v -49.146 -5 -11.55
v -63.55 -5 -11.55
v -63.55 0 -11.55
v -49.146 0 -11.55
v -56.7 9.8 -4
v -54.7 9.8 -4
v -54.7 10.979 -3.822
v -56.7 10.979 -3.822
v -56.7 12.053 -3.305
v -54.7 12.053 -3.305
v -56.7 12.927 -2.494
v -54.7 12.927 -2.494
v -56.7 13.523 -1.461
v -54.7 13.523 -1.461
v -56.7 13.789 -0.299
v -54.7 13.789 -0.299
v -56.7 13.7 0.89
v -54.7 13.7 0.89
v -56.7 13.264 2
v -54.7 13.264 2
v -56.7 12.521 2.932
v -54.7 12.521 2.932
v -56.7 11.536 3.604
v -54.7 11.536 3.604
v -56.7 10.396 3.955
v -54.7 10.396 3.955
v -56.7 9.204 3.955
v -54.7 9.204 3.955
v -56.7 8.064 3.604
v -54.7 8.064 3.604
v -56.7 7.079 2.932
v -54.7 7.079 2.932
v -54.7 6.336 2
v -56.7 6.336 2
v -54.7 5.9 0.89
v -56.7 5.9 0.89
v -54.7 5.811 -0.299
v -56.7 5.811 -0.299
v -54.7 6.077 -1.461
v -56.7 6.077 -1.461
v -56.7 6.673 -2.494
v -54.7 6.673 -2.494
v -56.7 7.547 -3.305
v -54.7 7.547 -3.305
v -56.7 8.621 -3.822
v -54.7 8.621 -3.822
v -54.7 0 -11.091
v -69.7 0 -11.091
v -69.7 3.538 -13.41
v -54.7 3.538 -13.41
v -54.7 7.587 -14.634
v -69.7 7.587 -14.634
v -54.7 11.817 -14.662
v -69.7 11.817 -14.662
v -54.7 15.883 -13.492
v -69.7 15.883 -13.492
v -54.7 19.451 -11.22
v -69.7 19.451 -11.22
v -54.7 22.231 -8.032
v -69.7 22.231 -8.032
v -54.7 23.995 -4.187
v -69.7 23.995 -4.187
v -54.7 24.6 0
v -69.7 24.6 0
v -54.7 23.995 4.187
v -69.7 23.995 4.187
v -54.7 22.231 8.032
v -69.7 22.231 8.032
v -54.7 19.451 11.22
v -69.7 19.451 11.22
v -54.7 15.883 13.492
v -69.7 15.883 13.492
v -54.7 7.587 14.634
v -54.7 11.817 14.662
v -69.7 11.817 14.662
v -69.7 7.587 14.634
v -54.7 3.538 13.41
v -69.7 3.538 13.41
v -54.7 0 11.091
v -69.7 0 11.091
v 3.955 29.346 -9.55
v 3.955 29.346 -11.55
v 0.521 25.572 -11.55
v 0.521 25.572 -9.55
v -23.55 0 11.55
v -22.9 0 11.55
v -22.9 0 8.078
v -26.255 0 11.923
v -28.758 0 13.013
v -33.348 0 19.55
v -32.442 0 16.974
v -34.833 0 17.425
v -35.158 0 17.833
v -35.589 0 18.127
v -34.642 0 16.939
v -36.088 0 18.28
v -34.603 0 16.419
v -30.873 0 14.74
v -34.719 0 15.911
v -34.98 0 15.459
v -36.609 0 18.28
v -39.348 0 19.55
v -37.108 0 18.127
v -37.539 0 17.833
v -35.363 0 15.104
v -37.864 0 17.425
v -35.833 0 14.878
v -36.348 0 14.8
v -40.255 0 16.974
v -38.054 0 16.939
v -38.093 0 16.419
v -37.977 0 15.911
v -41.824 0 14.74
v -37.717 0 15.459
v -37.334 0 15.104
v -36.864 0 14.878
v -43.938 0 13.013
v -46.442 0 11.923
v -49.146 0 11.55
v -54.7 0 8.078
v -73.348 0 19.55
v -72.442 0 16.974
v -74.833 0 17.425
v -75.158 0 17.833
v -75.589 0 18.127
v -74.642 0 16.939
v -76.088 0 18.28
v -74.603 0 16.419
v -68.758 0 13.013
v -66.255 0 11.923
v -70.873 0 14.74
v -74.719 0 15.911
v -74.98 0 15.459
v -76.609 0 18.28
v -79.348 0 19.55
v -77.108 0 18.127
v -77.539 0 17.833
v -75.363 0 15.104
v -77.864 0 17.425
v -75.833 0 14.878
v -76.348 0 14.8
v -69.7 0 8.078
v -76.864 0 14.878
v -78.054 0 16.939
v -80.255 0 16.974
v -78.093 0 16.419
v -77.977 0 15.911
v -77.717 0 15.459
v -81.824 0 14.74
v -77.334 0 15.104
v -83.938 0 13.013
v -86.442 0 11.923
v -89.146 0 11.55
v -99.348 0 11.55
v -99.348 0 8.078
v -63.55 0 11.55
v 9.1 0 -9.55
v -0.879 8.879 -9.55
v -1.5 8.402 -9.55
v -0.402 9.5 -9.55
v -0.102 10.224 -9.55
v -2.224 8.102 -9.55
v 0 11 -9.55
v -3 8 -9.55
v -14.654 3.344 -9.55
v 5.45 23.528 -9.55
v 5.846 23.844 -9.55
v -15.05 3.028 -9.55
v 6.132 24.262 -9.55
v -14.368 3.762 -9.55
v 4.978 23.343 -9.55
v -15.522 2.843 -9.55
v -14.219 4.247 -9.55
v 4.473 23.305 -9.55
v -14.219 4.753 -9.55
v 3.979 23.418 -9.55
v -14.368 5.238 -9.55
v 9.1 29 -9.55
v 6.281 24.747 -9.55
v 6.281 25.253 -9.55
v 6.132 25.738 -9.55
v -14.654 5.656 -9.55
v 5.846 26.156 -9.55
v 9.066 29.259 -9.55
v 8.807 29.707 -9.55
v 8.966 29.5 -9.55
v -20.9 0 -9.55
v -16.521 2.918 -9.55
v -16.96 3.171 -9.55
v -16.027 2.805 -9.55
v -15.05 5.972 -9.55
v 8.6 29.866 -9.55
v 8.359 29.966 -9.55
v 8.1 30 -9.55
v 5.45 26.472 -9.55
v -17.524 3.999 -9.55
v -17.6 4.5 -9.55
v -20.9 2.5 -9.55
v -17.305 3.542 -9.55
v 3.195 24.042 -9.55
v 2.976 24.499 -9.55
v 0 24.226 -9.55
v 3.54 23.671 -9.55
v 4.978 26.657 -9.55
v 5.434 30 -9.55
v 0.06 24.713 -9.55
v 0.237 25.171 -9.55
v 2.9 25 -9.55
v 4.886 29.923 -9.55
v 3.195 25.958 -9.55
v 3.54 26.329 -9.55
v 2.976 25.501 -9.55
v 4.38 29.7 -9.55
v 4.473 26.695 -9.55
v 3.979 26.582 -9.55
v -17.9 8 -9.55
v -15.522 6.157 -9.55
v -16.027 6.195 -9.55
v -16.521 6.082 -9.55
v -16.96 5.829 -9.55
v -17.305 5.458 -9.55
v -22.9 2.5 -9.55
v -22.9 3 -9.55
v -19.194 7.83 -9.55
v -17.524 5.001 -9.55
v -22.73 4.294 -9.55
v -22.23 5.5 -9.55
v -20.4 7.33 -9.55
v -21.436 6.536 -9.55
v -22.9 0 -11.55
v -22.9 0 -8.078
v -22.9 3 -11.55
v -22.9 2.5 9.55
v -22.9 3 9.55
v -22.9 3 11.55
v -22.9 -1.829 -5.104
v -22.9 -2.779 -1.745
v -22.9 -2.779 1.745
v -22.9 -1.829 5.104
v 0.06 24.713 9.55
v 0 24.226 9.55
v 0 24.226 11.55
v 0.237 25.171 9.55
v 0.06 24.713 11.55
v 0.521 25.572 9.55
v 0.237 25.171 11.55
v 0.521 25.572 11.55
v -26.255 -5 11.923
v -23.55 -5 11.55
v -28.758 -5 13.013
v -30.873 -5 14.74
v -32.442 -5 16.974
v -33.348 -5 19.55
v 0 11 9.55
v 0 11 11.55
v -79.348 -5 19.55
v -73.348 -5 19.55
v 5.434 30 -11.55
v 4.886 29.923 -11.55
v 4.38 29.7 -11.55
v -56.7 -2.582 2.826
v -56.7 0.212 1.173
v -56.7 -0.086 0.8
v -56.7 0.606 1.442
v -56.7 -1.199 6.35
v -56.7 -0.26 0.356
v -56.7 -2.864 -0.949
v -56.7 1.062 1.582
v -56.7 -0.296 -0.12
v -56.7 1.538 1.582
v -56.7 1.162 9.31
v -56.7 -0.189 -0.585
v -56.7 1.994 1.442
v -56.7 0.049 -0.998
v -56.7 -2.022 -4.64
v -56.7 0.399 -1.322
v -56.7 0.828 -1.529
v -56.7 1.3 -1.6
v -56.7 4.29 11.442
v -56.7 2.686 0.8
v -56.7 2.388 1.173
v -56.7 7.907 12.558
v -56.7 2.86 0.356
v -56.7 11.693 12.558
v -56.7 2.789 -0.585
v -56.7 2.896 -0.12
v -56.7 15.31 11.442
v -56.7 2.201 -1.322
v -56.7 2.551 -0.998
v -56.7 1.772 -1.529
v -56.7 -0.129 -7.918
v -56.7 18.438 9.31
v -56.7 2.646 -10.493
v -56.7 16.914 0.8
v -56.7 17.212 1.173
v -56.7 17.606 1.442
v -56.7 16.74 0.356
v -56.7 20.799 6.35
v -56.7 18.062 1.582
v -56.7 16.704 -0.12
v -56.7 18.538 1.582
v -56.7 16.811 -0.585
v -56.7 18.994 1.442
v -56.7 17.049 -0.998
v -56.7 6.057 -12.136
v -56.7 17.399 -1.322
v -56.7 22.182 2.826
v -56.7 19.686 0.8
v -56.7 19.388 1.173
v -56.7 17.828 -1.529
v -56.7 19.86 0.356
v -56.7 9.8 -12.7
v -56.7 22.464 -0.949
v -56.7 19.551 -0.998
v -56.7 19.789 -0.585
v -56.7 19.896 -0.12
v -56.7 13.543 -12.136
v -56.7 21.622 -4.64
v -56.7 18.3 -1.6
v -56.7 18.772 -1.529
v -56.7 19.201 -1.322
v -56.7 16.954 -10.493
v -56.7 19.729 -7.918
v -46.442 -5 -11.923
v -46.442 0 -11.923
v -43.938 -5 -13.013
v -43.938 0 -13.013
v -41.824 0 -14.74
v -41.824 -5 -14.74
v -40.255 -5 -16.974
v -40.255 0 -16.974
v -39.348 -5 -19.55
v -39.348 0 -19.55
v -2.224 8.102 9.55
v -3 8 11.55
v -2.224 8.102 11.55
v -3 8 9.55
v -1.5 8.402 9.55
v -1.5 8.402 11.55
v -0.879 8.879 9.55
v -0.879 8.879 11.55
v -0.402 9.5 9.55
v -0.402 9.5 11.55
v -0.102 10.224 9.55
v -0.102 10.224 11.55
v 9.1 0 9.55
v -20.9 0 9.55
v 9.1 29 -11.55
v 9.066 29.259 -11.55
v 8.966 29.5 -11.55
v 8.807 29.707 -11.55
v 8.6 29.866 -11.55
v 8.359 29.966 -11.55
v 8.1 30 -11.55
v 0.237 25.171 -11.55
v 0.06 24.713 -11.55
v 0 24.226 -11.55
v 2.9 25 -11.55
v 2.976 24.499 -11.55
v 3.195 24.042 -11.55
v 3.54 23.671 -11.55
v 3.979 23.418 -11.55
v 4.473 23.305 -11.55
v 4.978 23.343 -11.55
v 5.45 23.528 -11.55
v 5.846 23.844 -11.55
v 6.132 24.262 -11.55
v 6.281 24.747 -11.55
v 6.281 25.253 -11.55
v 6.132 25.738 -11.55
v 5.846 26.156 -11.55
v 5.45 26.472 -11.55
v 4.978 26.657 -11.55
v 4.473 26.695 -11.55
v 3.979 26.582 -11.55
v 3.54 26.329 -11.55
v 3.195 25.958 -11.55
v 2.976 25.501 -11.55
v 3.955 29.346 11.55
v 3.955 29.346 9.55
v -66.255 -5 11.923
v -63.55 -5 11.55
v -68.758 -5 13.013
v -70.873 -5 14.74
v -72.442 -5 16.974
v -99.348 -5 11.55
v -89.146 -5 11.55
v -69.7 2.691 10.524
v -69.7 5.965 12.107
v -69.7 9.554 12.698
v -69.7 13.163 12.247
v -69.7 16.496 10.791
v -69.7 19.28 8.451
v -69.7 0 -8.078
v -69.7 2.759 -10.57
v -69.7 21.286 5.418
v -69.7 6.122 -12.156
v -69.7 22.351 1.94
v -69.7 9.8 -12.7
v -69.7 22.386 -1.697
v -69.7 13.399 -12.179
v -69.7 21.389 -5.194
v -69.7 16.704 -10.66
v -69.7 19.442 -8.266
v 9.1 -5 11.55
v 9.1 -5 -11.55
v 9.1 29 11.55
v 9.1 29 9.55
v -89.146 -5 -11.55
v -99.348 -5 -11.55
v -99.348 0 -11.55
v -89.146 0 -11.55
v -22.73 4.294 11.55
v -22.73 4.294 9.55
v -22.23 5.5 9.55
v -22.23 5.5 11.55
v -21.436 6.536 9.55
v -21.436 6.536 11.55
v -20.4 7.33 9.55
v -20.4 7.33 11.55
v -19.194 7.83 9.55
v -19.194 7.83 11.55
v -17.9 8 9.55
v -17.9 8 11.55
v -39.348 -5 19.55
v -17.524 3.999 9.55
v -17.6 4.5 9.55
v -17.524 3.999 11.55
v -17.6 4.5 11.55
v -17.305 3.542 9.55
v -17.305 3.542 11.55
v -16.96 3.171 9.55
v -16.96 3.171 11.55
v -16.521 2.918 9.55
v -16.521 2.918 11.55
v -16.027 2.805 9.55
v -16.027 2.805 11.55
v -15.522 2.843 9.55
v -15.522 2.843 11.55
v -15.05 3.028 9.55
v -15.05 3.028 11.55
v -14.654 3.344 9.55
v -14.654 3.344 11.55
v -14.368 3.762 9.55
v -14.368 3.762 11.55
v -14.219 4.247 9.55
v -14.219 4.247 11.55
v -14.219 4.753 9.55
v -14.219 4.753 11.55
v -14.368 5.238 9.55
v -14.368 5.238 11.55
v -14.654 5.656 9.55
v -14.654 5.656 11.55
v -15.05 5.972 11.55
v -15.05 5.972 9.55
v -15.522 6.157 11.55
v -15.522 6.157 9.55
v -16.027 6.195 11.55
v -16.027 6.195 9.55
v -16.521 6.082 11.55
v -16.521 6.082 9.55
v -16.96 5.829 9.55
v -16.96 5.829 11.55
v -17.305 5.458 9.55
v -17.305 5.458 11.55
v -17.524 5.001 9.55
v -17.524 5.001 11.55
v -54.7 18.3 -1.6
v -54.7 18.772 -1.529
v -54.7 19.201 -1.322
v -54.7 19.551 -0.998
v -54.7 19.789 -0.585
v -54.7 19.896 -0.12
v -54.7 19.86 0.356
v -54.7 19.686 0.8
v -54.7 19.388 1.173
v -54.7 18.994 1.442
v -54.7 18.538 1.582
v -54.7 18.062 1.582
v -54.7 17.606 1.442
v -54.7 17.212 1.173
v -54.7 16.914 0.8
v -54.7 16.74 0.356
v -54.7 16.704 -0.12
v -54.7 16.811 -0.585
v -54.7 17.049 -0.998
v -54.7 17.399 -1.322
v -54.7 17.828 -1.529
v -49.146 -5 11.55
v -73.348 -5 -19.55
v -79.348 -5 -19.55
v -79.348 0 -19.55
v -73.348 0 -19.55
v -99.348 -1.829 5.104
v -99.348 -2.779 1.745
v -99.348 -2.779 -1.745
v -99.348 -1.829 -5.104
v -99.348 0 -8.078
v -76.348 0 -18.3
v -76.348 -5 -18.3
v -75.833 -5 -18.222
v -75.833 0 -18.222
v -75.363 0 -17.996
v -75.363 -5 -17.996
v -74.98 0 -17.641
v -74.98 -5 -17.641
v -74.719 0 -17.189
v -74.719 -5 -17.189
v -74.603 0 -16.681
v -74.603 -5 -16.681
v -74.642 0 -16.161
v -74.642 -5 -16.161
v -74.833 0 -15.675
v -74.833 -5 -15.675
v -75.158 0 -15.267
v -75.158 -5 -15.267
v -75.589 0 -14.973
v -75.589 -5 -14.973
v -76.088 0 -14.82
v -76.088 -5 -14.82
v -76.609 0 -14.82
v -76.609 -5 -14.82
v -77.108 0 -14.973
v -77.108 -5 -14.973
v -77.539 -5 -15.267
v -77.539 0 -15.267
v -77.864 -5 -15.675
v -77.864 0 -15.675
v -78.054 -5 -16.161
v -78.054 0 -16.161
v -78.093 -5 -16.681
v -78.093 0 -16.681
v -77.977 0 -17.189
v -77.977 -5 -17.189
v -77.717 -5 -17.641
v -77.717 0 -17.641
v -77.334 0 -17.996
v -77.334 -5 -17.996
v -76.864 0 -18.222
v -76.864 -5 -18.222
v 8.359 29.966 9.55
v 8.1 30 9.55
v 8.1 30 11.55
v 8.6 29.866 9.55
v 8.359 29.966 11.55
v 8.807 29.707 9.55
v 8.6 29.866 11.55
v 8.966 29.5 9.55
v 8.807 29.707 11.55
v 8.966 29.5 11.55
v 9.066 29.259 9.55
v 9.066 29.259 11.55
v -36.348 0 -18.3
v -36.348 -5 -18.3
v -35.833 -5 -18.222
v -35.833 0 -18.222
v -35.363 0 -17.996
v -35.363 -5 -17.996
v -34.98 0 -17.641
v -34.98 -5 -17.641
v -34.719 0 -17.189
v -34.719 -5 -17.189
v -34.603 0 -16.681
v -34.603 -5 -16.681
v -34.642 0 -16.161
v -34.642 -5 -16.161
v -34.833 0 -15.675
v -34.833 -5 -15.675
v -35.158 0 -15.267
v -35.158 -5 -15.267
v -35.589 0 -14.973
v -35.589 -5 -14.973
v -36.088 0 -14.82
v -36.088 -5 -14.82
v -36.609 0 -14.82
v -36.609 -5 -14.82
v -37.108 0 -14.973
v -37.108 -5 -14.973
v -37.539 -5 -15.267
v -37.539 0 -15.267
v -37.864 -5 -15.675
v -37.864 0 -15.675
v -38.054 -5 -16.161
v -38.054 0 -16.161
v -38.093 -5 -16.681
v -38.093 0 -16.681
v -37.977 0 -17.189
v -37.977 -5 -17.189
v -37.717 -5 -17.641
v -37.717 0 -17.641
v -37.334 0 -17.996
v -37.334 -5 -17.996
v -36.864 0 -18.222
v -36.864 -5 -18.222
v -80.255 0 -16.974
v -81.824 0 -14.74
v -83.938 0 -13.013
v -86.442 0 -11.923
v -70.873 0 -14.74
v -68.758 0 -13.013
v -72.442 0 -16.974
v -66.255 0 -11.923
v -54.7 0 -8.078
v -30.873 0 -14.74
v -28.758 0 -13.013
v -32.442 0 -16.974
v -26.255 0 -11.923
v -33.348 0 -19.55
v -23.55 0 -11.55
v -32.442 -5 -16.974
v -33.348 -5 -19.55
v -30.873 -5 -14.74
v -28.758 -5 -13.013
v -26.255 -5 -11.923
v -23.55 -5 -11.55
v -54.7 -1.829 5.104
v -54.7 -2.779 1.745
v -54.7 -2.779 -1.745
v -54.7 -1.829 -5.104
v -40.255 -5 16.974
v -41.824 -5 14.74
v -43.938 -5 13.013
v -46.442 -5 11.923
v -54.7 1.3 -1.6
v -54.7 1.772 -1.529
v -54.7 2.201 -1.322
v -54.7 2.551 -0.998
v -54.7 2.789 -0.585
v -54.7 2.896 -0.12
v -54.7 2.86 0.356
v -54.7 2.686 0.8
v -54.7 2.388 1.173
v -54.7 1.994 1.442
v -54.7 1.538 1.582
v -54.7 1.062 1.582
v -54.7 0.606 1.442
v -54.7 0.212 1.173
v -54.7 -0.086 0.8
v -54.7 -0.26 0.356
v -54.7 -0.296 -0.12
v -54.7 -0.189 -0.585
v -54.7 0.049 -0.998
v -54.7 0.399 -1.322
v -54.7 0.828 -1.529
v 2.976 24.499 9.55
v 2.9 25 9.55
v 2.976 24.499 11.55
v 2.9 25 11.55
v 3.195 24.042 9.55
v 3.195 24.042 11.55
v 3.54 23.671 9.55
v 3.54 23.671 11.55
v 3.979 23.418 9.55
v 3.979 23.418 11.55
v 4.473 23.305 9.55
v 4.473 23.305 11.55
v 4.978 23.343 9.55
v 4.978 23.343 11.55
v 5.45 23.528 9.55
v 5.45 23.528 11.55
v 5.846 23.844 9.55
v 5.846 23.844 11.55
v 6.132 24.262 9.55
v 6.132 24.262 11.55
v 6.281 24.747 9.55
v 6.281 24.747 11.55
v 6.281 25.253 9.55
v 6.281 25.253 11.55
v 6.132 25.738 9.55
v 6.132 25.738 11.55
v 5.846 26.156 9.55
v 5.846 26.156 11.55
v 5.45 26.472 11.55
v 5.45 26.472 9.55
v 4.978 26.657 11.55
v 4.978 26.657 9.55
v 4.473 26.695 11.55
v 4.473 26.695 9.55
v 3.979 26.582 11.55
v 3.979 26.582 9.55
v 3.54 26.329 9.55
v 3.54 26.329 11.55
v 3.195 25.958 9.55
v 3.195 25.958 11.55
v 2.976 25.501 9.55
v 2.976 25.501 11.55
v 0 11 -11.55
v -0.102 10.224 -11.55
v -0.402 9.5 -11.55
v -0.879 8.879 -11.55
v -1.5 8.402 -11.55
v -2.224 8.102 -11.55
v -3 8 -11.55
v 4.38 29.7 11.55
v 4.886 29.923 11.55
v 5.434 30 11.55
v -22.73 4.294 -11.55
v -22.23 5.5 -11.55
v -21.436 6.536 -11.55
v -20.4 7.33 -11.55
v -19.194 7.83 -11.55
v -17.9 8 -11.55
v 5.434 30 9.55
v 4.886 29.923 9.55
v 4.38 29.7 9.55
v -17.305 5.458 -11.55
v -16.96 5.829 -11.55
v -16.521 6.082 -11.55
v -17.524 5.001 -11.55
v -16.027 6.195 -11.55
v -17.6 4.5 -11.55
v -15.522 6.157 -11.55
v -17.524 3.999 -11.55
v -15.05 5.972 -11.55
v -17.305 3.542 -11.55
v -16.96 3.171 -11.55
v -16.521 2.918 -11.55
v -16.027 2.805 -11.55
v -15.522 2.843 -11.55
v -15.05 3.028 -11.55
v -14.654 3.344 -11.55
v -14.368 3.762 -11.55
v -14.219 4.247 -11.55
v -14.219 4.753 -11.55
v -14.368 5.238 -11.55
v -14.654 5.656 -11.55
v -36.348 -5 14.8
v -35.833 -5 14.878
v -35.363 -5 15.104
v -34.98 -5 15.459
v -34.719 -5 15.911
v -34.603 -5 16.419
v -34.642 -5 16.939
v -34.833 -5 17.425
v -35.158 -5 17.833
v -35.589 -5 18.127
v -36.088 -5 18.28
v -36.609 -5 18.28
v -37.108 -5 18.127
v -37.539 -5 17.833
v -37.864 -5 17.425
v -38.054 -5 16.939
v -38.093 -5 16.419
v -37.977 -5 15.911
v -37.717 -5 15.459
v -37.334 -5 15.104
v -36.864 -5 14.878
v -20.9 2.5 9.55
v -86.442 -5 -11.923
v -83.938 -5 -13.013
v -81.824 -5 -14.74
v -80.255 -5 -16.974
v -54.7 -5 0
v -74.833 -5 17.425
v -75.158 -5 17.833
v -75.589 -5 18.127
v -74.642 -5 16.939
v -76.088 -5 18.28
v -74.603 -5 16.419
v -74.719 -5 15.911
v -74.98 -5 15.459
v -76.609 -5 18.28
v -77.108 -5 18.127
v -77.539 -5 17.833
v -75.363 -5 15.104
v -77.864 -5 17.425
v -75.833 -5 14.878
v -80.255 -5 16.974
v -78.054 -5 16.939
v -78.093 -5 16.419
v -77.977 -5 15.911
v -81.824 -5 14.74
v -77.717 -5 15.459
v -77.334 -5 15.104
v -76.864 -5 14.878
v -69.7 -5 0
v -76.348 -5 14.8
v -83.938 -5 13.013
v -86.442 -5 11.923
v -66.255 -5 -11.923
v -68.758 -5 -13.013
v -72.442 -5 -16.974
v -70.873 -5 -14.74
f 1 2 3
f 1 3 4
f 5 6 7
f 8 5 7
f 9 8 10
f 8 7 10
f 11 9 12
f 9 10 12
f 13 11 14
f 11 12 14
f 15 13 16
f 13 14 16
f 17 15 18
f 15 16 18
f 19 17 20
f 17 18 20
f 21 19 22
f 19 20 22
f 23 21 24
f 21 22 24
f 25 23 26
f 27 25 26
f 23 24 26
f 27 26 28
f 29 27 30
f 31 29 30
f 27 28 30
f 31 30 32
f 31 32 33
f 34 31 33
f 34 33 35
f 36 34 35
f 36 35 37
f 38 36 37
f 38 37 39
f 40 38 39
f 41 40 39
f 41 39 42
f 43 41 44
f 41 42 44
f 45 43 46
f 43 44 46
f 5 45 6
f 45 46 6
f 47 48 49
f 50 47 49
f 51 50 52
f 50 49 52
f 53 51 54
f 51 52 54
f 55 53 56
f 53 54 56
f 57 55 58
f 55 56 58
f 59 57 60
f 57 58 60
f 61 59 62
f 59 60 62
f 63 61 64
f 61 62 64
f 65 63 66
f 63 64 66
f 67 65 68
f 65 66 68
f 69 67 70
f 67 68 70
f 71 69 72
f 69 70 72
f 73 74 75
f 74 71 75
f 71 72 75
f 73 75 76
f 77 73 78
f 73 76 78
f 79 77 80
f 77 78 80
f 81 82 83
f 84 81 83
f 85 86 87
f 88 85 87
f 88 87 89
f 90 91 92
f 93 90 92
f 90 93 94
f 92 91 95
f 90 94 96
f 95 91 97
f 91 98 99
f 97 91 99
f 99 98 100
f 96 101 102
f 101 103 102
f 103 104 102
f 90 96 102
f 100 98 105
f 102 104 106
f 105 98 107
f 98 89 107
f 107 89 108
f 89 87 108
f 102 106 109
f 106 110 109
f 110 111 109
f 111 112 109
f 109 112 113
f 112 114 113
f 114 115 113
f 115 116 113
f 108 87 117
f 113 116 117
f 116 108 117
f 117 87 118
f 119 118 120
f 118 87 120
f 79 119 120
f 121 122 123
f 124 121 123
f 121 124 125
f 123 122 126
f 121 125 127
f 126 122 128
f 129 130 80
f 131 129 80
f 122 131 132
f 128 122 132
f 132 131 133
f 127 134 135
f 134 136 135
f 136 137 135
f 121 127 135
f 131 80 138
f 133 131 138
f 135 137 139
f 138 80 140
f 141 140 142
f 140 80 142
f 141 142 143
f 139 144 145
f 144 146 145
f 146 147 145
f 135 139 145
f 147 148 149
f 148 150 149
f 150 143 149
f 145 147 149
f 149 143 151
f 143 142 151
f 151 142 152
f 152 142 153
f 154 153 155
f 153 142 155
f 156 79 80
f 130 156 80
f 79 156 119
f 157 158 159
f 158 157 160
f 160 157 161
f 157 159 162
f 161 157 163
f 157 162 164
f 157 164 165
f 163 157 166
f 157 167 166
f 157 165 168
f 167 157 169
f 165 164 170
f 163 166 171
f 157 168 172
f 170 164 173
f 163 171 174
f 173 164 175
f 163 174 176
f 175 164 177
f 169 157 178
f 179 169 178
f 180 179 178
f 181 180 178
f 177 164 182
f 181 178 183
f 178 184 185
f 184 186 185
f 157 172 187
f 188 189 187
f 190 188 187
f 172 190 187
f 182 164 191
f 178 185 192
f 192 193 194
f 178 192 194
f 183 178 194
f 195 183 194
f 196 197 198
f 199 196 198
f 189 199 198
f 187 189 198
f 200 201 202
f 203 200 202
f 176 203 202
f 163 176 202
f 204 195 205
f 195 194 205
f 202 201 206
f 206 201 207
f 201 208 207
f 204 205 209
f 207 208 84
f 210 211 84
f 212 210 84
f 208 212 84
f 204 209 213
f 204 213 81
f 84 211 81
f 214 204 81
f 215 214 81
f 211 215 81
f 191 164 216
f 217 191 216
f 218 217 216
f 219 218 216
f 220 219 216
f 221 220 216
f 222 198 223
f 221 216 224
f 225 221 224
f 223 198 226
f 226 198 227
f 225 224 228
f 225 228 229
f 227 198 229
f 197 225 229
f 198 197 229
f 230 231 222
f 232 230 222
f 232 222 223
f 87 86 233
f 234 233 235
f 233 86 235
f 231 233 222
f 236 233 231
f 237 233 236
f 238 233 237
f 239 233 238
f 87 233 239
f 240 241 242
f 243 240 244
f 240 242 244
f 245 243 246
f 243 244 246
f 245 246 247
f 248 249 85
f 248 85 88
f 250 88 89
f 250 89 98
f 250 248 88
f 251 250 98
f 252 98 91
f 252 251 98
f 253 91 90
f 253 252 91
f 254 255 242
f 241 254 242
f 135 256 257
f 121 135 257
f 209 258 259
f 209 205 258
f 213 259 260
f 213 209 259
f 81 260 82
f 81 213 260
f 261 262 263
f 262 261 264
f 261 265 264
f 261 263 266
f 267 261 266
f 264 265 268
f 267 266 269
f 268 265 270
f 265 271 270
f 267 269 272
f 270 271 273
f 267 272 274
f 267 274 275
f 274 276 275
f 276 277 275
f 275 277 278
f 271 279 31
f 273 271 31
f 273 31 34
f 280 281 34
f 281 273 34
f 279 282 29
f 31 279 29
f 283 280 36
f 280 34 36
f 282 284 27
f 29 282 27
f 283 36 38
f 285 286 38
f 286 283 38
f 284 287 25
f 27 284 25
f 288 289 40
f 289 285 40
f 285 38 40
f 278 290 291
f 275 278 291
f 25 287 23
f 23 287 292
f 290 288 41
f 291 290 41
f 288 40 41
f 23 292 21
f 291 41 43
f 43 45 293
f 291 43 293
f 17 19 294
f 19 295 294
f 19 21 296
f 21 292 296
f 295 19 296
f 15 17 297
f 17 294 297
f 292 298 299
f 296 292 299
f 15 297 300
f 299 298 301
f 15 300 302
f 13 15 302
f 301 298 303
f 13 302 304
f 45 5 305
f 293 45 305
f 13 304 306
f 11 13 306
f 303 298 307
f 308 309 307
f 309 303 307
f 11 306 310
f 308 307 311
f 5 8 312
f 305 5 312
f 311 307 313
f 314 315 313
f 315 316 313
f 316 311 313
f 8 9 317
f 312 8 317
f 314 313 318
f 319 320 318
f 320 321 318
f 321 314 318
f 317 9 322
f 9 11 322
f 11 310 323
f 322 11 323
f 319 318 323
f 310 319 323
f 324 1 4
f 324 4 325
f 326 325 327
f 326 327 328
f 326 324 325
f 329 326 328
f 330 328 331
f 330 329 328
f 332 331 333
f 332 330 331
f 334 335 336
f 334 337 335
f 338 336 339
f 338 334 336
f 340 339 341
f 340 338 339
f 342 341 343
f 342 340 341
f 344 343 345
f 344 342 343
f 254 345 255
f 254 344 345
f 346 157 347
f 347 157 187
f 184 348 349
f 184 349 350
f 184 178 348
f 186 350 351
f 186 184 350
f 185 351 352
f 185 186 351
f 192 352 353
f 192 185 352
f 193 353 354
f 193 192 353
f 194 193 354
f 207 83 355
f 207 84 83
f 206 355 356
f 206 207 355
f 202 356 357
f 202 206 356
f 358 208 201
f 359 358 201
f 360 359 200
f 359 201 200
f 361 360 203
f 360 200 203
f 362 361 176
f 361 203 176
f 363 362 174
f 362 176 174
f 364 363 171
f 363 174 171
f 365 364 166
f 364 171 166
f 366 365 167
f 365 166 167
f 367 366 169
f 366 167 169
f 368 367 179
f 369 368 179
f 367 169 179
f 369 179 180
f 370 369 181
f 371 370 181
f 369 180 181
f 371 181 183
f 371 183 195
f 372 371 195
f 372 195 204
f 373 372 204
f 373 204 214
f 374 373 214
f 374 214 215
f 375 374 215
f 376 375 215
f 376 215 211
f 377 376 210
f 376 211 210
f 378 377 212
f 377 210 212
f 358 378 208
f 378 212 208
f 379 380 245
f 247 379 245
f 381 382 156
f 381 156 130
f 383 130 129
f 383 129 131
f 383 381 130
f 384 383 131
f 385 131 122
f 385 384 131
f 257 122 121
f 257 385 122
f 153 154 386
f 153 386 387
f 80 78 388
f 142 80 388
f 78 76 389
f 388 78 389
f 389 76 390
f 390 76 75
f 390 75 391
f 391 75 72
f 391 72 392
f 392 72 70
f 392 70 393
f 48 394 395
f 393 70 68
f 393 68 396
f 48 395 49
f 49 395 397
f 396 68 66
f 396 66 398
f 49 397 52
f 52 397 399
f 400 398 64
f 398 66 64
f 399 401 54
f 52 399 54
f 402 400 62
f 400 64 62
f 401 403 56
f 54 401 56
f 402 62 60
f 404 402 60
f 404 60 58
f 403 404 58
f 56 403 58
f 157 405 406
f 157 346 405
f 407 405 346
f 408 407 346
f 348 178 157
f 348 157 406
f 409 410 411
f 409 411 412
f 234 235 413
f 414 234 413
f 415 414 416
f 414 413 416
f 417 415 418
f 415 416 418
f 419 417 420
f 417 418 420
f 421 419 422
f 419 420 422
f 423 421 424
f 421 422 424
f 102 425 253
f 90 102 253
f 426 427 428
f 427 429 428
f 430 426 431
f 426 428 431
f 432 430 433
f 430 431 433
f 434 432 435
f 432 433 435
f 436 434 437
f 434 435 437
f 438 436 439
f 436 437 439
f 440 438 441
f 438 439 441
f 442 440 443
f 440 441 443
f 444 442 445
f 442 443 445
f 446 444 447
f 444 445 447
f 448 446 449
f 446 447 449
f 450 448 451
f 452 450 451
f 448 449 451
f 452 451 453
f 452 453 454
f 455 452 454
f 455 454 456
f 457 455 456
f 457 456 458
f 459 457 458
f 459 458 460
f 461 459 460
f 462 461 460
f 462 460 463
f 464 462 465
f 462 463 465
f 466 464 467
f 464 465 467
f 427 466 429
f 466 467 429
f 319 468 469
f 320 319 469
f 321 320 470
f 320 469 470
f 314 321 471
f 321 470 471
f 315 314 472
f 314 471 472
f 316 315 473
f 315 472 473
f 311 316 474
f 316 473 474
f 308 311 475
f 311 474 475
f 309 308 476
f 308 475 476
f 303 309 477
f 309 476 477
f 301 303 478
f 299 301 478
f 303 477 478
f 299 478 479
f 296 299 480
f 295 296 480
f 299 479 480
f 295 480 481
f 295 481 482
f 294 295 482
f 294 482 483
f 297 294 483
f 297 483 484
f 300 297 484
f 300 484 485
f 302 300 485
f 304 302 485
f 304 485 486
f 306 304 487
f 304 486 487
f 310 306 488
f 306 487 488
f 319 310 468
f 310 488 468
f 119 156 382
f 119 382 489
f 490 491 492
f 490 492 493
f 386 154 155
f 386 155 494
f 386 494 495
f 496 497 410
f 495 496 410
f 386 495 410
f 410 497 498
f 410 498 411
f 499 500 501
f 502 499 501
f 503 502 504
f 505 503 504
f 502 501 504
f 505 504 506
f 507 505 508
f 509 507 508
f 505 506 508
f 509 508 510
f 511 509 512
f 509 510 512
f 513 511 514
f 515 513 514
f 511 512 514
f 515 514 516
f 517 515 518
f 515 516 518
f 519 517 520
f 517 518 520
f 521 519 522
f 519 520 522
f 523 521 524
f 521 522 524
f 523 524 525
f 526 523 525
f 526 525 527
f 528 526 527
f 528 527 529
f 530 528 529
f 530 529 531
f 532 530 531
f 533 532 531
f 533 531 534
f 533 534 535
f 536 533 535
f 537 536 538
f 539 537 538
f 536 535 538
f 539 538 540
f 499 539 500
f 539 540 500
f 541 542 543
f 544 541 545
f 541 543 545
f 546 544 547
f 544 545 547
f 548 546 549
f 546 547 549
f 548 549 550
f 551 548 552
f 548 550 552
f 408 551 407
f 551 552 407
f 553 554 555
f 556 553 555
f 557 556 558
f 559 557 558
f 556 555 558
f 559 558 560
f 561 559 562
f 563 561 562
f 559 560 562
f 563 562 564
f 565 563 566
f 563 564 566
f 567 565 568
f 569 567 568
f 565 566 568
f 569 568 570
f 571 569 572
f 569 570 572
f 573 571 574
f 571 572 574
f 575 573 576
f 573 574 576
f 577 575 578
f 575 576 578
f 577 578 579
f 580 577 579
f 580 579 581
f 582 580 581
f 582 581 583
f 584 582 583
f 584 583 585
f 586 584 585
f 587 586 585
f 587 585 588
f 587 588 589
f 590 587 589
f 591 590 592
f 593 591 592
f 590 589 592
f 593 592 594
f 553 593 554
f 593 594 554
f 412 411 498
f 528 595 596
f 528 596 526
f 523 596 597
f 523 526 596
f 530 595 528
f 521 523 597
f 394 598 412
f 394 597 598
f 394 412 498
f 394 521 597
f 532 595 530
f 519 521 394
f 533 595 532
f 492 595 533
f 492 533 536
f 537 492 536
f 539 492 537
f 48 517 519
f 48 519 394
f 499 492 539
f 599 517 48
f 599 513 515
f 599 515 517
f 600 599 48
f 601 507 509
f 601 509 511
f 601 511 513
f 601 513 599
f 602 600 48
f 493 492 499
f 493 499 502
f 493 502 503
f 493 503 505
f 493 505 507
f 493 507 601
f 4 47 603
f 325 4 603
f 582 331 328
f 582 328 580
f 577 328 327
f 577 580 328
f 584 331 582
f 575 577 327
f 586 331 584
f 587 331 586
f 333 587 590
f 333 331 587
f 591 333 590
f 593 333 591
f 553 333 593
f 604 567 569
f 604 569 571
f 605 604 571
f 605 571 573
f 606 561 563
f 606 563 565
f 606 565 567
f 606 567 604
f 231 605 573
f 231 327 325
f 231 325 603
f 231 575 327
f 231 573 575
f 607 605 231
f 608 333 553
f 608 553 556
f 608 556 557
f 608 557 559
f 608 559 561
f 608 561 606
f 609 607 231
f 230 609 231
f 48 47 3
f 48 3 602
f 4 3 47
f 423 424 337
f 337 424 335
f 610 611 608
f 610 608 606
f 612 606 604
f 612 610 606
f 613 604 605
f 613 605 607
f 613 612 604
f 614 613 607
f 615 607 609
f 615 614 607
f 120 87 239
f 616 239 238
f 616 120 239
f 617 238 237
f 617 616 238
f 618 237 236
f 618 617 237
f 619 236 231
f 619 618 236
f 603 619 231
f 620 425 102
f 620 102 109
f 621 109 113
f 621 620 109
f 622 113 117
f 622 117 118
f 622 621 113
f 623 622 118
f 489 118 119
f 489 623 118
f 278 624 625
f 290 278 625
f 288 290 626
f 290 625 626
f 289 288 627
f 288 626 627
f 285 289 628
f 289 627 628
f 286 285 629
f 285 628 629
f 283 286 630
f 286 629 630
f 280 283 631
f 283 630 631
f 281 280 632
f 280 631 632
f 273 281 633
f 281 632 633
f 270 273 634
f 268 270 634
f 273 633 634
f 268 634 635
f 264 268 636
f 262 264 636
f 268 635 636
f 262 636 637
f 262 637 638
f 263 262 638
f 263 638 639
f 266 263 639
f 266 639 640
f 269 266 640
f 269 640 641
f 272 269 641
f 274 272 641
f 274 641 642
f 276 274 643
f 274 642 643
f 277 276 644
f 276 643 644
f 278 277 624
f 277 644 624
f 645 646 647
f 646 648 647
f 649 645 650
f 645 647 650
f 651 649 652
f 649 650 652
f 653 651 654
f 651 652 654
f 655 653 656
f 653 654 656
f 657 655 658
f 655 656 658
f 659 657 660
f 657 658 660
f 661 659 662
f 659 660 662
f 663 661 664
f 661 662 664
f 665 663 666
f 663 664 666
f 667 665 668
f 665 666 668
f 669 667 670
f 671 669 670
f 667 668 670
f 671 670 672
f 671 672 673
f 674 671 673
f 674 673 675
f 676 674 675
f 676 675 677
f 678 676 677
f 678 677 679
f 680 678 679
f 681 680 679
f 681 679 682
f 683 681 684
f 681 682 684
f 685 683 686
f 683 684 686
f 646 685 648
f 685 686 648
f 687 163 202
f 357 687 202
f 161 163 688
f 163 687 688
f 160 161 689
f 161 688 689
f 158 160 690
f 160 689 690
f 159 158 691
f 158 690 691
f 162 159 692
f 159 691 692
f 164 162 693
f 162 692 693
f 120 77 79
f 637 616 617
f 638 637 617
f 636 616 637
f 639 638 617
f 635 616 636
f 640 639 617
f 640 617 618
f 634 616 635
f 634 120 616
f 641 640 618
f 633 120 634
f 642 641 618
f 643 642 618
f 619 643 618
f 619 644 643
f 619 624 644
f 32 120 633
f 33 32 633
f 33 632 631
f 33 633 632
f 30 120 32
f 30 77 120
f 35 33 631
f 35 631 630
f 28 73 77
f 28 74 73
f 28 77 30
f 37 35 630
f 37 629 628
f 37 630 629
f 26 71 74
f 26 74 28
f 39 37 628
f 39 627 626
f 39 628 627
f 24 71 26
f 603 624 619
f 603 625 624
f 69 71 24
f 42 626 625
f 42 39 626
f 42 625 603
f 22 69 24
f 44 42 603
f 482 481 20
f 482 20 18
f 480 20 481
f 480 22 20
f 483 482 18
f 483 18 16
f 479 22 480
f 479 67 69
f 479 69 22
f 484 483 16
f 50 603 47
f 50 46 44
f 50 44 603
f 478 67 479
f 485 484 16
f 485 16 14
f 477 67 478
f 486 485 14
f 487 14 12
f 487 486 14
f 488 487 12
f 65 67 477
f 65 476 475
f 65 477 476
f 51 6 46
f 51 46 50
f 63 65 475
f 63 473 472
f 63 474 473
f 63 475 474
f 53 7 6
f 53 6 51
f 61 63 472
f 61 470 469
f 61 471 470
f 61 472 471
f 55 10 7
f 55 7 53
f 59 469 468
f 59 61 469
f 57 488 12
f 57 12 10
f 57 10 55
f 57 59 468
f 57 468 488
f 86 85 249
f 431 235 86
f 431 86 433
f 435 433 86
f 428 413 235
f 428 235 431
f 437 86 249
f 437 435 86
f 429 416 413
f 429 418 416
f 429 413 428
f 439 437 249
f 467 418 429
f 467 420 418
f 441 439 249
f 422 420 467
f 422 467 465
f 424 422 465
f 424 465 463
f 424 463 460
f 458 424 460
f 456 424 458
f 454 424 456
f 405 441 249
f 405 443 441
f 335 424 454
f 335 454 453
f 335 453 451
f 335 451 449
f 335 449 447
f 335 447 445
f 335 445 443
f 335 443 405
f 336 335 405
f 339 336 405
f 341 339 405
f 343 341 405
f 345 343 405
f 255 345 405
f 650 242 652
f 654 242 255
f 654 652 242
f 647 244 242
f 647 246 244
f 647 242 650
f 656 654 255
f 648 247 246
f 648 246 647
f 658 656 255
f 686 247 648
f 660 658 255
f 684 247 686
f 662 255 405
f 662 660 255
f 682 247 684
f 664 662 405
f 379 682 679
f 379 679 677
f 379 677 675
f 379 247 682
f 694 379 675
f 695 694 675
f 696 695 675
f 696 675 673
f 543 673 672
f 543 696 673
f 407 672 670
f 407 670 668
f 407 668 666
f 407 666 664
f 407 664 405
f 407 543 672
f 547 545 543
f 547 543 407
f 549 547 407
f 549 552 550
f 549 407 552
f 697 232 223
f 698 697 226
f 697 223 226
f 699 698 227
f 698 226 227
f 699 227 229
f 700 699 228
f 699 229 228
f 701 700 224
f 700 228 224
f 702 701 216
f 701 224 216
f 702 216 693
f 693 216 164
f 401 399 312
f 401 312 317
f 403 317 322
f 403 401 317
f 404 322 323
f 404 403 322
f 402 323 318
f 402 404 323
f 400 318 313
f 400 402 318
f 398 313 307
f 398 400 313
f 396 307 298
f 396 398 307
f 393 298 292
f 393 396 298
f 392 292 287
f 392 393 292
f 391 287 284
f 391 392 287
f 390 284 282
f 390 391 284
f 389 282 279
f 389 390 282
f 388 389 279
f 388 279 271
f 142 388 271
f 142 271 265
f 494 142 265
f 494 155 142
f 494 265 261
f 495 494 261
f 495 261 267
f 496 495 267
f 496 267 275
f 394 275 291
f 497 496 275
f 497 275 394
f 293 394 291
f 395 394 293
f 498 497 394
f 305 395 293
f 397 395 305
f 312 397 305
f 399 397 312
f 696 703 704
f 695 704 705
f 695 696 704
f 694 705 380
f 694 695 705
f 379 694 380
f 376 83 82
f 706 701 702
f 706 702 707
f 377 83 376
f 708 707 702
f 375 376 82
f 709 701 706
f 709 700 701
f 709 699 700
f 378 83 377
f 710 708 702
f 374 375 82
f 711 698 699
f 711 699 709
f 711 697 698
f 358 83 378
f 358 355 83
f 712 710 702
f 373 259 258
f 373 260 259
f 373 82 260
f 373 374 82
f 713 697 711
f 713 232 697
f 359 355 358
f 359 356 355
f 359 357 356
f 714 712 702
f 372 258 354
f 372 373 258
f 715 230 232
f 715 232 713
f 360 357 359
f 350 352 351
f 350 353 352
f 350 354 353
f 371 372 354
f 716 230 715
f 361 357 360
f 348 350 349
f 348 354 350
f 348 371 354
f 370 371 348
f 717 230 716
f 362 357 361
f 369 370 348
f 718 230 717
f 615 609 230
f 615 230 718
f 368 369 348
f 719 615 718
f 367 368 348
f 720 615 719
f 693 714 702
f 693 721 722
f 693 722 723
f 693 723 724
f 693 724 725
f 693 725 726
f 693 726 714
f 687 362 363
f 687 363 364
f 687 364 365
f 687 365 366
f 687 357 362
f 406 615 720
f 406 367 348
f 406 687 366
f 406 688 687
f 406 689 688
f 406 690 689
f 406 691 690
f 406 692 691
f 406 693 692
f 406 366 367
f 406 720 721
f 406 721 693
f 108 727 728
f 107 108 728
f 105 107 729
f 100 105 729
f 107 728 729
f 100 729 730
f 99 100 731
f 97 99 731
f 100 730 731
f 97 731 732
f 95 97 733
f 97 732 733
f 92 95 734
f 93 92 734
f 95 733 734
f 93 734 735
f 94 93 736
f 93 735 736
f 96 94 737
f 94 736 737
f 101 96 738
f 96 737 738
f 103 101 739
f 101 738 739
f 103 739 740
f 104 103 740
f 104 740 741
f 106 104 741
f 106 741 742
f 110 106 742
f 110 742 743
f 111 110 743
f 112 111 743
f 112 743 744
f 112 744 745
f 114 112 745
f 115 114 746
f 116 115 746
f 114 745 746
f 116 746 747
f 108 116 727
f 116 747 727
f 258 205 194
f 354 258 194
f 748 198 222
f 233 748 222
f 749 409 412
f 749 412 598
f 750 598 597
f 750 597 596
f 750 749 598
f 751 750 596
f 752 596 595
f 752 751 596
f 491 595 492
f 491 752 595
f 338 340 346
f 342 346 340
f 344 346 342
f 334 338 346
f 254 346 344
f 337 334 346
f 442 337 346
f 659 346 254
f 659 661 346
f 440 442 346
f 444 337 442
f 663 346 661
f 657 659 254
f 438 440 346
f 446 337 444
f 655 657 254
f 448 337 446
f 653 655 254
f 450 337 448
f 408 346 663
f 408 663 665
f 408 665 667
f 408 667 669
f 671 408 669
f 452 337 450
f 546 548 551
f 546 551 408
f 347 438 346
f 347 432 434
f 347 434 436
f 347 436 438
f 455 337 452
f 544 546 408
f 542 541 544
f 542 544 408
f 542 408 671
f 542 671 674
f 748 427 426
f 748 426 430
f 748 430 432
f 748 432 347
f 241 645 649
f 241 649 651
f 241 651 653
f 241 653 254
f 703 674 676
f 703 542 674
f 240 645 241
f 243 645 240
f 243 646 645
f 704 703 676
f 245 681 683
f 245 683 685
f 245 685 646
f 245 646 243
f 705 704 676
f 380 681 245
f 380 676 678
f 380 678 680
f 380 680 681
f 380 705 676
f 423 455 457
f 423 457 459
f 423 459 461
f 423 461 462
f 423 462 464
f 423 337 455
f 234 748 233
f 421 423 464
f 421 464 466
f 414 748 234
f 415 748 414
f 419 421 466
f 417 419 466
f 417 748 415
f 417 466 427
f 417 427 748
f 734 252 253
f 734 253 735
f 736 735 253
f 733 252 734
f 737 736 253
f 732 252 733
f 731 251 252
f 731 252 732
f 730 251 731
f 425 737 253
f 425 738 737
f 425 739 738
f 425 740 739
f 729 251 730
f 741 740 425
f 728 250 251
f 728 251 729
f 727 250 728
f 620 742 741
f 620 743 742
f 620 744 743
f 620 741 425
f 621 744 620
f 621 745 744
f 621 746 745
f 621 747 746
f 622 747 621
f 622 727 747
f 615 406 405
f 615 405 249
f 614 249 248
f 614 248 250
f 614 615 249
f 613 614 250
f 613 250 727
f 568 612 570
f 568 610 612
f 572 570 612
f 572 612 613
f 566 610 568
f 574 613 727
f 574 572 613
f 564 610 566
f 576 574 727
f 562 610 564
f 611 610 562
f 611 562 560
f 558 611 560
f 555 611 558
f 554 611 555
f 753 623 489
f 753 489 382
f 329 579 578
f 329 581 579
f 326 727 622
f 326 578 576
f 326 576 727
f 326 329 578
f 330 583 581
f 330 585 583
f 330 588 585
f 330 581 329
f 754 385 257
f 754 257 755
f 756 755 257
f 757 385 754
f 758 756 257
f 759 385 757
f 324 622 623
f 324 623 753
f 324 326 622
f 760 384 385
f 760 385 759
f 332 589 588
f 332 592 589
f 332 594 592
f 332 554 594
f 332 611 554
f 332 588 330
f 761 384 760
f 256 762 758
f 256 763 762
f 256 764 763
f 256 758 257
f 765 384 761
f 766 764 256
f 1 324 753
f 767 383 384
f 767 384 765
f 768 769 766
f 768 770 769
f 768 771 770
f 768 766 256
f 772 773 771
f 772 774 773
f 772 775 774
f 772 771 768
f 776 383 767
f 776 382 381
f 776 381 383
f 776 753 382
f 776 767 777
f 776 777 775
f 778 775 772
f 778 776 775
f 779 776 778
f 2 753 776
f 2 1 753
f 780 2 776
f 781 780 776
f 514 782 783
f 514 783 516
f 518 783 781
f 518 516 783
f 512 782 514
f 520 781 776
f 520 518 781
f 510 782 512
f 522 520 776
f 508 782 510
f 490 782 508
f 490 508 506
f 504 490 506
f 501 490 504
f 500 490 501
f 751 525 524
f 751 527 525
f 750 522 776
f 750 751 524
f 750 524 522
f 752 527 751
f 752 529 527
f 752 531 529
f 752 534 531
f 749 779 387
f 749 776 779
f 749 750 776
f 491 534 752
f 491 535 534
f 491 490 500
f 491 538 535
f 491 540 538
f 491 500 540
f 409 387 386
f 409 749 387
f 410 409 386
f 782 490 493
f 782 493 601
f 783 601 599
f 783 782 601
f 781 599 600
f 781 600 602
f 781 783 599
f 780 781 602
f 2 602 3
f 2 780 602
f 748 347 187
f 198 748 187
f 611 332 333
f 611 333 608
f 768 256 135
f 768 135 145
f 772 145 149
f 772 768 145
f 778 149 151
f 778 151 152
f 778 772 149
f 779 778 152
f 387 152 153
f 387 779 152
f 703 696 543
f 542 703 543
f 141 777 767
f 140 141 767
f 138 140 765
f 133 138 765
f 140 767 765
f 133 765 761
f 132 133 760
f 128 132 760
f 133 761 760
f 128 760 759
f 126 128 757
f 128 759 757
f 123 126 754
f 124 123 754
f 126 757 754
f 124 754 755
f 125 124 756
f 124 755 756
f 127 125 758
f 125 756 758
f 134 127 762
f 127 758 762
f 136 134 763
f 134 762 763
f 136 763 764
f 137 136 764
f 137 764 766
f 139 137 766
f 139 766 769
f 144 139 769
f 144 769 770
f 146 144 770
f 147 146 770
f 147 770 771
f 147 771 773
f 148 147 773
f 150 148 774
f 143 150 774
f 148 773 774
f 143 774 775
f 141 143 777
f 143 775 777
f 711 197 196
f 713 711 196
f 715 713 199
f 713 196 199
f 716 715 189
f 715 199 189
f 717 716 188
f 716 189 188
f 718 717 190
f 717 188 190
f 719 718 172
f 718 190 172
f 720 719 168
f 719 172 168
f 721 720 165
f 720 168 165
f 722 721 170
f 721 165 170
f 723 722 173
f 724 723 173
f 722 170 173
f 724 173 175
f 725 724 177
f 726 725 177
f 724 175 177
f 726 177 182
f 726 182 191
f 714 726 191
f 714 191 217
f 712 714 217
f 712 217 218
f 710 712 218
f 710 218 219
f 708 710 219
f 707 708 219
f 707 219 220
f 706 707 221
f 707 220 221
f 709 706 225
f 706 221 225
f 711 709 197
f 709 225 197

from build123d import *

# Parameters (mm, degrees)
SKETCH3_W                       = 111.348371095
SKETCH3_H                       = 23.1
BOSS_EXTRUDE1_DEPTH             = 5
SKETCH3_4_W                     = 34.9
SKETCH3_4_H                     = 23.1
BOSS_EXTRUDE2_DEPTH             = 2.5
CUT_EXTRUDE1_DEPTH              = 30.8
CUT_EXTRUDE1_DEPTH_BACK         = 67.894637304
SKETCH4_4_R                     = 12.7
BOSS_EXTRUDE3_START             = -1
SKETCH4_R                       = 12.7
SKETCH4_R_2                     = 4
SKETCH4_R_3                     = 1.6
BOSS_EXTRUDE3_DEPTH             = 2
BOSS_EXTRUDE4_DEPTH             = 2
BOSS_EXTRUDE4_DEPTH_BACK        = 13
BOSS_EXTRUDE4_START             = -3
SKETCH4_3_R                     = 14.8
SKETCH4_3_R_2                   = 12.7
BOSS_EXTRUDE6_REACH             = 105.413
SKETCH6_R                       = 1.7
BOSS_EXTRUDE6_DIRECTION_2_REACH = 105.413
CUT_EXTRUDE5_START              = -9.55
SKETCH6_9_R                     = 1.7
CUT_EXTRUDE5_DEPTH              = 19.1
FILLET1_R                       = 3
SKETCH12_W                      = 31.185762671
SKETCH12_H                      = 41.424107397
CUT_EXTRUDE9_DEPTH              = 2.9
FILLET2_R                       = 1
CUT_EXTRUDE10_DEPTH             = 108.072038083
FILLET3_R                       = 2
SKETCH14_W                      = 6
SKETCH14_H                      = 8
SKETCH14_R                      = 1.75
BOSS_EXTRUDE8_DEPTH             = 5
FILLET4_R                       = 10


with BuildPart() as part:
    # Sketch3 → Boss-Extrude1 (new body)
    with BuildSketch(Plane(origin=(0, 0, 0), x_dir=(1, 0, 0), z_dir=(0, 1, 0))):
        with Locations((-43.674185548, 0)):
            Rectangle(SKETCH3_W, SKETCH3_H)
    extrude(amount=-BOSS_EXTRUDE1_DEPTH)

    # Sketch3<4> → Boss-Extrude2 (add)
    with BuildSketch(Plane(origin=(0, 0, 0), x_dir=(1, 0, 0), z_dir=(0, 1, 0))):
        with Locations((-5.45, 0)):
            Rectangle(SKETCH3_4_W, SKETCH3_4_H)
        Polygon((-20.2, 9.55), (9.3, 9.55), (10, 9.55), (10, -9.55), (9.3, -9.55), (-20.2, -9.55), (-20.9, -9.55), (-20.9, 9.55), align=None, mode=Mode.SUBTRACT)
    extrude(amount=BOSS_EXTRUDE2_DEPTH)

    # Sketch4<4> → Cut-Extrude1 (cut, two sides: drawn at the far end of the back side and taken through both)
    with BuildSketch(Plane(origin=(-53.7, 0, 0), x_dir=(0, 0, -1), z_dir=(1, 0, 0)).offset(-CUT_EXTRUDE1_DEPTH_BACK)):
        with Locations((0, 9.8)):
            Circle(SKETCH4_4_R)
    extrude(amount=CUT_EXTRUDE1_DEPTH + CUT_EXTRUDE1_DEPTH_BACK, mode=Mode.SUBTRACT)

    # Sketch4 → Boss-Extrude3 (add)
    with BuildSketch(Plane(origin=(-53.7, 0, 0), x_dir=(0, 0, -1), z_dir=(1, 0, 0)).offset(BOSS_EXTRUDE3_START)):
        with Locations((0, 9.8)):
            Circle(SKETCH4_R)
        with Locations((0, 9.8)):
            Circle(SKETCH4_R_2, mode=Mode.SUBTRACT)
        with Locations((0, 18.3)):
            Circle(SKETCH4_R_3, mode=Mode.SUBTRACT)
        with Locations((0, 1.3)):
            Circle(SKETCH4_R_3, mode=Mode.SUBTRACT)
    extrude(amount=-BOSS_EXTRUDE3_DEPTH)

    # Sketch4<3> → Boss-Extrude4 (add, two sides: drawn at the far end of the back side and taken through both)
    with BuildSketch(Plane(origin=(-53.7, 0, 0), x_dir=(0, 0, -1), z_dir=(1, 0, 0)).offset(BOSS_EXTRUDE4_START - BOSS_EXTRUDE4_DEPTH_BACK)):
        with Locations((0, 9.8)):
            Circle(SKETCH4_3_R)
        with Locations((0, 9.8)):
            Circle(SKETCH4_3_R_2, mode=Mode.SUBTRACT)
    extrude(amount=BOSS_EXTRUDE4_DEPTH + BOSS_EXTRUDE4_DEPTH_BACK)

    # Boss-Extrude6: up to this face of the body (flat: up to its plane)
    boss_extrude6_end = Plane(part.part.faces().sort_by_distance((-38.495455163, -1.99193845, 11.55))[0])
    # Sketch6 → Boss-Extrude6 (add, up to the picked face)
    with BuildSketch(Plane.XY, mode=Mode.PRIVATE) as boss_extrude6_sk1:
        with BuildLine():
            Line((-22.9, 2.5), (-22.9, 3))
            ThreePointArc((-22.9, 3), (-21.435533906, 6.535533906), (-17.9, 8))
            Line((-17.9, 8), (-8.9, 8))
            Line((-8.9, 8), (0, 8))
            Line((0, 8), (0, 29))
            ThreePointArc((0, 29), (0.292893219, 29.707106781), (1, 30))
            Line((1, 30), (11, 30))
            ThreePointArc((11, 30), (11.707106781, 29.707106781), (12, 29))
            Line((12, 29), (12, 2.5))
            Line((12, 2.5), (12, 0))
            Line((12, 0), (10, 0))
            Line((10, 0), (10, 2.5))
            Line((10, 2.5), (-22.9, 2.5))
        make_face()
        with Locations(Location((-15.9, 4.5, 0), (0, 0, 180))):
            Circle(SKETCH6_R, mode=Mode.SUBTRACT)
        with Locations(Location((4.6, 25, 0), (0, 0, 180))):
            Circle(SKETCH6_R, mode=Mode.SUBTRACT)
    boss_extrude6_tool1 = split(extrude(boss_extrude6_sk1.sketch, amount=BOSS_EXTRUDE6_REACH, mode=Mode.PRIVATE), bisect_by=boss_extrude6_end, keep=Keep.BOTH, mode=Mode.PRIVATE)
    add(boss_extrude6_tool1.solids().sort_by(Axis((1.853009, 13.07203, 0), (0, 0, 1)))[0])

    # Boss-Extrude6 direction 2: up to this face of the body (flat: up to its plane)
    boss_extrude6_direction_2_end = Plane(part.part.faces().sort_by_distance((-38.495455163, -1.99193845, -11.55))[0])
    # Sketch6 → Boss-Extrude6 direction 2 (add, up to the picked face)
    with BuildSketch(Plane.XY, mode=Mode.PRIVATE) as boss_extrude6_direction_2_sk1:
        with BuildLine():
            Line((-22.9, 2.5), (-22.9, 3))
            ThreePointArc((-22.9, 3), (-21.435533906, 6.535533906), (-17.9, 8))
            Line((-17.9, 8), (-8.9, 8))
            Line((-8.9, 8), (0, 8))
            Line((0, 8), (0, 29))
            ThreePointArc((0, 29), (0.292893219, 29.707106781), (1, 30))
            Line((1, 30), (11, 30))
            ThreePointArc((11, 30), (11.707106781, 29.707106781), (12, 29))
            Line((12, 29), (12, 2.5))
            Line((12, 2.5), (12, 0))
            Line((12, 0), (10, 0))
            Line((10, 0), (10, 2.5))
            Line((10, 2.5), (-22.9, 2.5))
        make_face()
        with Locations(Location((-15.9, 4.5, 0), (0, 0, 180))):
            Circle(SKETCH6_R, mode=Mode.SUBTRACT)
        with Locations(Location((4.6, 25, 0), (0, 0, 180))):
            Circle(SKETCH6_R, mode=Mode.SUBTRACT)
    boss_extrude6_direction_2_tool1 = split(extrude(boss_extrude6_direction_2_sk1.sketch, amount=-BOSS_EXTRUDE6_DIRECTION_2_REACH, mode=Mode.PRIVATE), bisect_by=boss_extrude6_direction_2_end, keep=Keep.BOTH, mode=Mode.PRIVATE)
    add(boss_extrude6_direction_2_tool1.solids().sort_by(Axis((1.853009, 13.07203, 0), (0, 0, -1)))[0])

    # Sketch6<9> → Cut-Extrude5 (cut)
    with BuildSketch(Plane.XY.offset(CUT_EXTRUDE5_START)):
        with BuildLine():
            Line((-22.9, 2.5), (-22.9, 3))
            ThreePointArc((-22.9, 3), (-21.435533906, 6.535533906), (-17.9, 8))
            Line((-17.9, 8), (-8.9, 8))
            Line((-8.9, 8), (0, 8))
            Line((0, 8), (0, 29))
            ThreePointArc((0, 29), (0.292893219, 29.707106781), (1, 30))
            Line((1, 30), (11, 30))
            ThreePointArc((11, 30), (11.707106781, 29.707106781), (12, 29))
            Line((12, 29), (12, 2.5))
            Line((12, 2.5), (12, 0))
            Line((12, 0), (10, 0))
            Line((10, 0), (10, 2.5))
            Line((10, 2.5), (-22.9, 2.5))
        make_face()
        with Locations(Location((-15.9, 4.5, 0), (0, 0, 180))):
            Circle(SKETCH6_9_R, mode=Mode.SUBTRACT)
        with Locations(Location((4.6, 25, 0), (0, 0, 180))):
            Circle(SKETCH6_9_R, mode=Mode.SUBTRACT)
    extrude(amount=CUT_EXTRUDE5_DEPTH, mode=Mode.SUBTRACT)

    # Fillet1
    fillet1_edges = [part.edges().sort_by_distance(p)[0] for p in [
        (0, 8, -10.55),
        (0, 8, 10.55),
    ]]
    fillet(fillet1_edges, radius=FILLET1_R)

    # Sketch12 → Cut-Extrude9 (cut)
    with BuildSketch(Plane(origin=(12, 0, 0), x_dir=(0, 0, -1), z_dir=(1, 0, 0))):
        with Locations((1.113943618, 12.240146633)):
            Rectangle(SKETCH12_W, SKETCH12_H)
    extrude(amount=-CUT_EXTRUDE9_DEPTH, mode=Mode.SUBTRACT)

    # Fillet2
    fillet2_edges = [part.edges().sort_by_distance(p)[0] for p in [
        (9.1, 30, 10.55),
        (9.1, 30, -10.55),
    ]]
    fillet(fillet2_edges, radius=FILLET2_R)

    # Sketch13 → Cut-Extrude10 (cut, through all)
    with BuildSketch(Plane(origin=(0, 0, -11.55), x_dir=(-1, 0, 0), z_dir=(0, 0, -1))):
        Polygon((-4.55, 30), (0, 25), (0, 30), align=None)
    extrude(amount=-CUT_EXTRUDE10_DEPTH, mode=Mode.SUBTRACT)

    # Fillet3
    fillet3_edges = [part.edges().sort_by_distance(p)[0] for p in [
        (0, 25, 10.55),
        (4.55, 30, 10.55),
        (4.55, 30, -10.55),
        (0, 25, -10.55),
    ]]
    fillet(fillet3_edges, radius=FILLET3_R)

    # Sketch14 → Boss-Extrude8 (add)
    # profile 1 of 4: a face of its own
    with BuildSketch(Plane.XZ.offset(5)):
        with Locations((-76.348371095, -15.55)):
            Rectangle(SKETCH14_W, SKETCH14_H)
        with Locations(Location((-76.348371095, -16.55, 0), (0, 0, 270))):
            Circle(SKETCH14_R, mode=Mode.SUBTRACT)
    # profile 2 of 4: a face of its own
    with BuildSketch(Plane.XZ.offset(5)):
        with Locations((-76.348371095, 15.55)):
            Rectangle(SKETCH14_W, SKETCH14_H)
        with Locations(Location((-76.348371095, 16.55, 0), (0, 0, 270))):
            Circle(SKETCH14_R, mode=Mode.SUBTRACT)
    # profile 3 of 4: a face of its own
    with BuildSketch(Plane.XZ.offset(5)):
        with Locations((-36.348371095, -15.55)):
            Rectangle(SKETCH14_W, SKETCH14_H)
        with Locations(Location((-36.348371095, -16.55, 0), (0, 0, 270))):
            Circle(SKETCH14_R, mode=Mode.SUBTRACT)
    # profile 4 of 4: a face of its own
    with BuildSketch(Plane.XZ.offset(5)):
        with Locations((-36.348371095, 15.55)):
            Rectangle(SKETCH14_W, SKETCH14_H)
        with Locations(Location((-36.348371095, 16.55, 0), (0, 0, 270))):
            Circle(SKETCH14_R, mode=Mode.SUBTRACT)
    extrude(amount=-BOSS_EXTRUDE8_DEPTH)

    # Fillet4
    # the kernel refuses this fillet: 10 mm, written as the material it adds along each edge
    with BuildSketch(Plane(origin=(-79.348371095, -5, 11.55), x_dir=(-1, 0, 0), z_dir=(0, 1, 0)), Plane(origin=(-73.348371095, -5, -11.55), x_dir=(1, 0, 0), z_dir=(0, 1, 0)), Plane(origin=(-39.348371095, -5, 11.55), x_dir=(-1, 0, 0), z_dir=(0, 1, 0)), Plane(origin=(-33.348371095, -5, -11.55), x_dir=(1, 0, 0), z_dir=(0, 1, 0))) as fillet4_piece_1:
        with BuildLine():
            CenterArc((9.797958971, 10), FILLET4_R, 191.536959033, 78.463040967)
            Line((0, 8), (-0.195959179, 7.96))
            ThreePointArc((-0.195959179, 7.96), (-0.2, 4), (-0.2, 0))
            Line((-0.2, 0), (0, -0.2))
            Line((0, -0.2), (9.797958971, -0.2))
            Line((9.797958971, -0.2), (9.797958971, 0))
        make_face()
    extrude(amount=5)
    with BuildSketch(Plane(origin=(-73.348371095, -5, 11.55), x_dir=(1, 0, 0), z_dir=(0, 1, 0)), Plane(origin=(-79.348371095, -5, -11.55), x_dir=(-1, 0, 0), z_dir=(0, 1, 0)), Plane(origin=(-33.348371095, -5, 11.55), x_dir=(1, 0, 0), z_dir=(0, 1, 0)), Plane(origin=(-39.348371095, -5, -11.55), x_dir=(-1, 0, 0), z_dir=(0, 1, 0))) as fillet4_piece_2:
        with BuildLine():
            CenterArc((9.797958971, -10), FILLET4_R, 90, 78.463040967)
            Line((0, -8), (-0.195959179, -7.96))
            ThreePointArc((-0.195959179, -7.96), (-0.2, -4), (-0.2, 0))
            Line((-0.2, 0), (0, 0.2))
            Line((0, 0.2), (9.797958971, 0.2))
            Line((9.797958971, 0.2), (9.797958971, 0))
        make_face()
    extrude(amount=5)


solid = part.part
